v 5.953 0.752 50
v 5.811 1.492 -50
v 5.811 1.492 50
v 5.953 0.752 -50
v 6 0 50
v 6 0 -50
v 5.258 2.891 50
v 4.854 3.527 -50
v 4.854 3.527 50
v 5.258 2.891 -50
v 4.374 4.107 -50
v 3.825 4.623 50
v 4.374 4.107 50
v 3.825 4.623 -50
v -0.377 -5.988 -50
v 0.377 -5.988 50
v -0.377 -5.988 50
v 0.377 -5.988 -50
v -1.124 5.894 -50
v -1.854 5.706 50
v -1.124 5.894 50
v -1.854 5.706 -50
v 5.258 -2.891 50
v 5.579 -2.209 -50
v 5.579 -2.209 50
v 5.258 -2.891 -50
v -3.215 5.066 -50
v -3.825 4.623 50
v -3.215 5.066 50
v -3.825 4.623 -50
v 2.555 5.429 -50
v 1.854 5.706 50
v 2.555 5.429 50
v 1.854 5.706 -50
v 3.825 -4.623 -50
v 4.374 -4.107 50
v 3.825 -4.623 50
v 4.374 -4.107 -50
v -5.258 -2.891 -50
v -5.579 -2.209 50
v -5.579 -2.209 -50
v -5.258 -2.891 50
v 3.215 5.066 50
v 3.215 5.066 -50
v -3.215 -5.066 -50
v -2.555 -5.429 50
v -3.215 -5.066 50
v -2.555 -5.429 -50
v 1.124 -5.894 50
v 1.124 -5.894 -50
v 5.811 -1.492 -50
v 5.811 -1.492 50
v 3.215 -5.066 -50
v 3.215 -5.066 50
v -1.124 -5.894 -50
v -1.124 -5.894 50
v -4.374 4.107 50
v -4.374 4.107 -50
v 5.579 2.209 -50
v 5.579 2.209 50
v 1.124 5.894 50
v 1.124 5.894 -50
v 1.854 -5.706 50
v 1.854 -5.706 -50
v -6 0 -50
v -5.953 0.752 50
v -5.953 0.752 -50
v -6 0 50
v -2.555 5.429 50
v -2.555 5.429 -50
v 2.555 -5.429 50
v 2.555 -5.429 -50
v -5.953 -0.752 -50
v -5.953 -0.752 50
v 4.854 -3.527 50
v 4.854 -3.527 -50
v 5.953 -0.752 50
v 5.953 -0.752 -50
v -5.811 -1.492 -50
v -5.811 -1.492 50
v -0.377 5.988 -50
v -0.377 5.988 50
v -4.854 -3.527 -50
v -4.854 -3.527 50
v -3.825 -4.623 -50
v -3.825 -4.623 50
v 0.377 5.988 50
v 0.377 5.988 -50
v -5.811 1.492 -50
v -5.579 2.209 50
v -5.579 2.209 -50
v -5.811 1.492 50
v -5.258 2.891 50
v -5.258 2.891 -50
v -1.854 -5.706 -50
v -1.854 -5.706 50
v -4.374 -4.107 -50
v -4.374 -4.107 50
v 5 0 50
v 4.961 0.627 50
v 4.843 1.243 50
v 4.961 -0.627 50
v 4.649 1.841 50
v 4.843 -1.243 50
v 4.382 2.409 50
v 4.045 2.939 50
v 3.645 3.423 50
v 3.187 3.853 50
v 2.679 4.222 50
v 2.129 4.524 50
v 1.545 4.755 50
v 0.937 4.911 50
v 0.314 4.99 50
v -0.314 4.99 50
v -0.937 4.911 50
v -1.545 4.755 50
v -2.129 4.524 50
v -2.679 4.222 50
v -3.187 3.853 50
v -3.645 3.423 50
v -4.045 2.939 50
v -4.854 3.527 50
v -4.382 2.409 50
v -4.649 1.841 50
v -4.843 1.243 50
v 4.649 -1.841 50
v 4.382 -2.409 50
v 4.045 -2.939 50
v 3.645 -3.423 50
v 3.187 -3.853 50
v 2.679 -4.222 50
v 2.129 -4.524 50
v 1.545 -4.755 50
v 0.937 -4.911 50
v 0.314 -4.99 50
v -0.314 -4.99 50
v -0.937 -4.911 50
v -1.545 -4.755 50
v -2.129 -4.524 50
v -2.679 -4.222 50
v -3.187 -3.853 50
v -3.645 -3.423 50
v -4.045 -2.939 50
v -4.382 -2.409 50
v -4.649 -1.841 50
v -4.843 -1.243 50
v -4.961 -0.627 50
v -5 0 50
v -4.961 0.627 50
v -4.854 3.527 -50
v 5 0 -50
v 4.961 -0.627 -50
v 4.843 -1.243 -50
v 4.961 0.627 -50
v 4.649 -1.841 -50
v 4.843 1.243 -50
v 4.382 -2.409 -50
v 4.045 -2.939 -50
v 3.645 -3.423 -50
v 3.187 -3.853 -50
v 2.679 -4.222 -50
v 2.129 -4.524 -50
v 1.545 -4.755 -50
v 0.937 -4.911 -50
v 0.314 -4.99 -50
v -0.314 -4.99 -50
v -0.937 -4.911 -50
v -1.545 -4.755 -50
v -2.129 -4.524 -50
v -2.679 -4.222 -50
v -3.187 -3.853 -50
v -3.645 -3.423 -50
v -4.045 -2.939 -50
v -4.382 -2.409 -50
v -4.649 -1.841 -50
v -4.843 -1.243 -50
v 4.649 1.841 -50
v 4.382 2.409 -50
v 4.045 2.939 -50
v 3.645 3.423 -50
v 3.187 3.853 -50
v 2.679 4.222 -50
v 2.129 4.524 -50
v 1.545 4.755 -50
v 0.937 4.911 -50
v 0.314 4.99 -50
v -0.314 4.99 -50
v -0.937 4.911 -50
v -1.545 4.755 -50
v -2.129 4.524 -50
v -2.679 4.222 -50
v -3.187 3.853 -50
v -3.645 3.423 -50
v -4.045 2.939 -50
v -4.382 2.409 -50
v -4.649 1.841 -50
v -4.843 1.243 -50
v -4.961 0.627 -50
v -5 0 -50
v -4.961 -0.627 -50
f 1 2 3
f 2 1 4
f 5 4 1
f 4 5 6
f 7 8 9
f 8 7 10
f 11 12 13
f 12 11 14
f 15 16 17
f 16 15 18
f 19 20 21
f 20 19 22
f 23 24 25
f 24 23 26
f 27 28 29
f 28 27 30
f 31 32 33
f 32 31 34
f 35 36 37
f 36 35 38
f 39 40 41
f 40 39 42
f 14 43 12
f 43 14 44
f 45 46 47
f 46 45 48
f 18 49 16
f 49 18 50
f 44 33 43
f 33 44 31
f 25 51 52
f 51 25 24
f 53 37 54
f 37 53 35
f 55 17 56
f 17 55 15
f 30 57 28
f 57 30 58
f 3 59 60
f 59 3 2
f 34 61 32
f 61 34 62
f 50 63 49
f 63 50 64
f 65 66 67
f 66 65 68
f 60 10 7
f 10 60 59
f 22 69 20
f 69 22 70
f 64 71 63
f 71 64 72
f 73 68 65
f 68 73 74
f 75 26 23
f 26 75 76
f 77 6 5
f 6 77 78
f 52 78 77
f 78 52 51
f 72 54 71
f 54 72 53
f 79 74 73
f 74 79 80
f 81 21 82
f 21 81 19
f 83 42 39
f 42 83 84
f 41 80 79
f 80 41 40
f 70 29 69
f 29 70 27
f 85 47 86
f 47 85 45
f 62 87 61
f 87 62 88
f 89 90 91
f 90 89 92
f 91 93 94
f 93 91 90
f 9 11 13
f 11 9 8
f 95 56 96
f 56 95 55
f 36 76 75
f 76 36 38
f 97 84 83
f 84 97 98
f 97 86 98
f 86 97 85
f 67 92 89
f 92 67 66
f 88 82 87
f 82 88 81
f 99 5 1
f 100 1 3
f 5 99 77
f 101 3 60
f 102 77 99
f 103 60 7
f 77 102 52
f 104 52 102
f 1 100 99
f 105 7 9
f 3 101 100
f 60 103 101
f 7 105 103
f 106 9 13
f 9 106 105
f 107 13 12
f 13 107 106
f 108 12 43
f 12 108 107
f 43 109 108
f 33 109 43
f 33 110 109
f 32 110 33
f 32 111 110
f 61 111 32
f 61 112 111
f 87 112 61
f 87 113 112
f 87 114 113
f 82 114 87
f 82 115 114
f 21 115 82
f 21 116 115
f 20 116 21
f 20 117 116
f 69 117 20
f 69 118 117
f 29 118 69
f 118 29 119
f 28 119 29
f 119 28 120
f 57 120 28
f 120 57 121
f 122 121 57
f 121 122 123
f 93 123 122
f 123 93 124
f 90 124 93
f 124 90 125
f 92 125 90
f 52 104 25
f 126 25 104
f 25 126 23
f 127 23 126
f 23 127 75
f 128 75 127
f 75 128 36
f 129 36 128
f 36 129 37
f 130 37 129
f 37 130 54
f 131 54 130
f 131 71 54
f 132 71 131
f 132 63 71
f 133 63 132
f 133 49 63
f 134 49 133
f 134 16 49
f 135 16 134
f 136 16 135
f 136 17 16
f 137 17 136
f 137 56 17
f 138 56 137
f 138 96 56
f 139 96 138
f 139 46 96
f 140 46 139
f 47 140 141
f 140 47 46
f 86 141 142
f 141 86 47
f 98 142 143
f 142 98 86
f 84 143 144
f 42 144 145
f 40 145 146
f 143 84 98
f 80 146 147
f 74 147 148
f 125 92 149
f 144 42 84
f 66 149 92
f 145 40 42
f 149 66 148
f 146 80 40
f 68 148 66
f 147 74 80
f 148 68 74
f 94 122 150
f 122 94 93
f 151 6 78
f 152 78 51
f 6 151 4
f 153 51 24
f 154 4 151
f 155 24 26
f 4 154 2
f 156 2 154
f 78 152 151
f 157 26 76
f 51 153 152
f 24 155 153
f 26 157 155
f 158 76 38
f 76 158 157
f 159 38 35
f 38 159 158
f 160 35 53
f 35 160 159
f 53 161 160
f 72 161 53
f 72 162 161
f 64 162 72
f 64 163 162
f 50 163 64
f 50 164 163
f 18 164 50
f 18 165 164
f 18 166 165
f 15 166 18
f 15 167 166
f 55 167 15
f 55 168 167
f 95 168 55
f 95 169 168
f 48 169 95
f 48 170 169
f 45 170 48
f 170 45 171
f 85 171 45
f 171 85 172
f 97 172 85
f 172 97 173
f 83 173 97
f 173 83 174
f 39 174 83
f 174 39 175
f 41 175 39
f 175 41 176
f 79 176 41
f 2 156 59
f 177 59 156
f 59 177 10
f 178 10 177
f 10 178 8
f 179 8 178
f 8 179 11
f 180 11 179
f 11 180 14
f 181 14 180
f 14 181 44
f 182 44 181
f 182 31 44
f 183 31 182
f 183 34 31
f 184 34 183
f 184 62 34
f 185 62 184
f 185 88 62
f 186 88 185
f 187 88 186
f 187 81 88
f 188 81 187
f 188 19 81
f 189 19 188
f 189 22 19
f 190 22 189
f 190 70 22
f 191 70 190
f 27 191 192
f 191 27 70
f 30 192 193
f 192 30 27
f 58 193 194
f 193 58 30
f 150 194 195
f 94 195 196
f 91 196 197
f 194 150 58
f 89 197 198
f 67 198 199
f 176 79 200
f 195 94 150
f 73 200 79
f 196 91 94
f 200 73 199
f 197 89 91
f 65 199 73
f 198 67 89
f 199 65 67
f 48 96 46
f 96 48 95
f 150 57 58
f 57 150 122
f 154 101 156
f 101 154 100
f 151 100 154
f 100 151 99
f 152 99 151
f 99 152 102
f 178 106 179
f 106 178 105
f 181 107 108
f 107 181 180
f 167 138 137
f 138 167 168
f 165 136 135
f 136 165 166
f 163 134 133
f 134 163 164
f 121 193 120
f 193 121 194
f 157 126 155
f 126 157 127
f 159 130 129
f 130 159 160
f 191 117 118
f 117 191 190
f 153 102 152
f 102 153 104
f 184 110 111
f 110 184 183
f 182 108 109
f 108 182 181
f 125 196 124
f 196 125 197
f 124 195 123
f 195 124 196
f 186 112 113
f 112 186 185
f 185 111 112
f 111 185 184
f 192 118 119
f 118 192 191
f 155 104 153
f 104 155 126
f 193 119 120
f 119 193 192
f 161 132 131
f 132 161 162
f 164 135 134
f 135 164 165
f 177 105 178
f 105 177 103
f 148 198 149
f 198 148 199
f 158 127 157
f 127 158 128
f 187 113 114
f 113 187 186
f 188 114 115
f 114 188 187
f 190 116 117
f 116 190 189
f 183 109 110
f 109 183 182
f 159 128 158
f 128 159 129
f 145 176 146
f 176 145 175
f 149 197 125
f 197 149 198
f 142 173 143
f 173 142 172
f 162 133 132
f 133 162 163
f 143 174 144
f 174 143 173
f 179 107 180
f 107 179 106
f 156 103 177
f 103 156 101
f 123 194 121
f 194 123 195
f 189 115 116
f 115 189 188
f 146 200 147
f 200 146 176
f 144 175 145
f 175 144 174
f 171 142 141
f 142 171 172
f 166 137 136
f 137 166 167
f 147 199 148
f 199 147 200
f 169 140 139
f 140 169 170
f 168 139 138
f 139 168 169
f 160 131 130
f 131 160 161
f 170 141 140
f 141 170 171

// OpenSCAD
$fn = 50;


difference() {
	union() {
		translate(v = [0, 0, -50.0000000000]) {
			cylinder(h = 100, r = 6.0000000000);
		}
	}
	union() {
		translate(v = [0, 0, -100.0000000000]) {
			cylinder(h = 200, r = 5.0000000000);
		}
	}
}
